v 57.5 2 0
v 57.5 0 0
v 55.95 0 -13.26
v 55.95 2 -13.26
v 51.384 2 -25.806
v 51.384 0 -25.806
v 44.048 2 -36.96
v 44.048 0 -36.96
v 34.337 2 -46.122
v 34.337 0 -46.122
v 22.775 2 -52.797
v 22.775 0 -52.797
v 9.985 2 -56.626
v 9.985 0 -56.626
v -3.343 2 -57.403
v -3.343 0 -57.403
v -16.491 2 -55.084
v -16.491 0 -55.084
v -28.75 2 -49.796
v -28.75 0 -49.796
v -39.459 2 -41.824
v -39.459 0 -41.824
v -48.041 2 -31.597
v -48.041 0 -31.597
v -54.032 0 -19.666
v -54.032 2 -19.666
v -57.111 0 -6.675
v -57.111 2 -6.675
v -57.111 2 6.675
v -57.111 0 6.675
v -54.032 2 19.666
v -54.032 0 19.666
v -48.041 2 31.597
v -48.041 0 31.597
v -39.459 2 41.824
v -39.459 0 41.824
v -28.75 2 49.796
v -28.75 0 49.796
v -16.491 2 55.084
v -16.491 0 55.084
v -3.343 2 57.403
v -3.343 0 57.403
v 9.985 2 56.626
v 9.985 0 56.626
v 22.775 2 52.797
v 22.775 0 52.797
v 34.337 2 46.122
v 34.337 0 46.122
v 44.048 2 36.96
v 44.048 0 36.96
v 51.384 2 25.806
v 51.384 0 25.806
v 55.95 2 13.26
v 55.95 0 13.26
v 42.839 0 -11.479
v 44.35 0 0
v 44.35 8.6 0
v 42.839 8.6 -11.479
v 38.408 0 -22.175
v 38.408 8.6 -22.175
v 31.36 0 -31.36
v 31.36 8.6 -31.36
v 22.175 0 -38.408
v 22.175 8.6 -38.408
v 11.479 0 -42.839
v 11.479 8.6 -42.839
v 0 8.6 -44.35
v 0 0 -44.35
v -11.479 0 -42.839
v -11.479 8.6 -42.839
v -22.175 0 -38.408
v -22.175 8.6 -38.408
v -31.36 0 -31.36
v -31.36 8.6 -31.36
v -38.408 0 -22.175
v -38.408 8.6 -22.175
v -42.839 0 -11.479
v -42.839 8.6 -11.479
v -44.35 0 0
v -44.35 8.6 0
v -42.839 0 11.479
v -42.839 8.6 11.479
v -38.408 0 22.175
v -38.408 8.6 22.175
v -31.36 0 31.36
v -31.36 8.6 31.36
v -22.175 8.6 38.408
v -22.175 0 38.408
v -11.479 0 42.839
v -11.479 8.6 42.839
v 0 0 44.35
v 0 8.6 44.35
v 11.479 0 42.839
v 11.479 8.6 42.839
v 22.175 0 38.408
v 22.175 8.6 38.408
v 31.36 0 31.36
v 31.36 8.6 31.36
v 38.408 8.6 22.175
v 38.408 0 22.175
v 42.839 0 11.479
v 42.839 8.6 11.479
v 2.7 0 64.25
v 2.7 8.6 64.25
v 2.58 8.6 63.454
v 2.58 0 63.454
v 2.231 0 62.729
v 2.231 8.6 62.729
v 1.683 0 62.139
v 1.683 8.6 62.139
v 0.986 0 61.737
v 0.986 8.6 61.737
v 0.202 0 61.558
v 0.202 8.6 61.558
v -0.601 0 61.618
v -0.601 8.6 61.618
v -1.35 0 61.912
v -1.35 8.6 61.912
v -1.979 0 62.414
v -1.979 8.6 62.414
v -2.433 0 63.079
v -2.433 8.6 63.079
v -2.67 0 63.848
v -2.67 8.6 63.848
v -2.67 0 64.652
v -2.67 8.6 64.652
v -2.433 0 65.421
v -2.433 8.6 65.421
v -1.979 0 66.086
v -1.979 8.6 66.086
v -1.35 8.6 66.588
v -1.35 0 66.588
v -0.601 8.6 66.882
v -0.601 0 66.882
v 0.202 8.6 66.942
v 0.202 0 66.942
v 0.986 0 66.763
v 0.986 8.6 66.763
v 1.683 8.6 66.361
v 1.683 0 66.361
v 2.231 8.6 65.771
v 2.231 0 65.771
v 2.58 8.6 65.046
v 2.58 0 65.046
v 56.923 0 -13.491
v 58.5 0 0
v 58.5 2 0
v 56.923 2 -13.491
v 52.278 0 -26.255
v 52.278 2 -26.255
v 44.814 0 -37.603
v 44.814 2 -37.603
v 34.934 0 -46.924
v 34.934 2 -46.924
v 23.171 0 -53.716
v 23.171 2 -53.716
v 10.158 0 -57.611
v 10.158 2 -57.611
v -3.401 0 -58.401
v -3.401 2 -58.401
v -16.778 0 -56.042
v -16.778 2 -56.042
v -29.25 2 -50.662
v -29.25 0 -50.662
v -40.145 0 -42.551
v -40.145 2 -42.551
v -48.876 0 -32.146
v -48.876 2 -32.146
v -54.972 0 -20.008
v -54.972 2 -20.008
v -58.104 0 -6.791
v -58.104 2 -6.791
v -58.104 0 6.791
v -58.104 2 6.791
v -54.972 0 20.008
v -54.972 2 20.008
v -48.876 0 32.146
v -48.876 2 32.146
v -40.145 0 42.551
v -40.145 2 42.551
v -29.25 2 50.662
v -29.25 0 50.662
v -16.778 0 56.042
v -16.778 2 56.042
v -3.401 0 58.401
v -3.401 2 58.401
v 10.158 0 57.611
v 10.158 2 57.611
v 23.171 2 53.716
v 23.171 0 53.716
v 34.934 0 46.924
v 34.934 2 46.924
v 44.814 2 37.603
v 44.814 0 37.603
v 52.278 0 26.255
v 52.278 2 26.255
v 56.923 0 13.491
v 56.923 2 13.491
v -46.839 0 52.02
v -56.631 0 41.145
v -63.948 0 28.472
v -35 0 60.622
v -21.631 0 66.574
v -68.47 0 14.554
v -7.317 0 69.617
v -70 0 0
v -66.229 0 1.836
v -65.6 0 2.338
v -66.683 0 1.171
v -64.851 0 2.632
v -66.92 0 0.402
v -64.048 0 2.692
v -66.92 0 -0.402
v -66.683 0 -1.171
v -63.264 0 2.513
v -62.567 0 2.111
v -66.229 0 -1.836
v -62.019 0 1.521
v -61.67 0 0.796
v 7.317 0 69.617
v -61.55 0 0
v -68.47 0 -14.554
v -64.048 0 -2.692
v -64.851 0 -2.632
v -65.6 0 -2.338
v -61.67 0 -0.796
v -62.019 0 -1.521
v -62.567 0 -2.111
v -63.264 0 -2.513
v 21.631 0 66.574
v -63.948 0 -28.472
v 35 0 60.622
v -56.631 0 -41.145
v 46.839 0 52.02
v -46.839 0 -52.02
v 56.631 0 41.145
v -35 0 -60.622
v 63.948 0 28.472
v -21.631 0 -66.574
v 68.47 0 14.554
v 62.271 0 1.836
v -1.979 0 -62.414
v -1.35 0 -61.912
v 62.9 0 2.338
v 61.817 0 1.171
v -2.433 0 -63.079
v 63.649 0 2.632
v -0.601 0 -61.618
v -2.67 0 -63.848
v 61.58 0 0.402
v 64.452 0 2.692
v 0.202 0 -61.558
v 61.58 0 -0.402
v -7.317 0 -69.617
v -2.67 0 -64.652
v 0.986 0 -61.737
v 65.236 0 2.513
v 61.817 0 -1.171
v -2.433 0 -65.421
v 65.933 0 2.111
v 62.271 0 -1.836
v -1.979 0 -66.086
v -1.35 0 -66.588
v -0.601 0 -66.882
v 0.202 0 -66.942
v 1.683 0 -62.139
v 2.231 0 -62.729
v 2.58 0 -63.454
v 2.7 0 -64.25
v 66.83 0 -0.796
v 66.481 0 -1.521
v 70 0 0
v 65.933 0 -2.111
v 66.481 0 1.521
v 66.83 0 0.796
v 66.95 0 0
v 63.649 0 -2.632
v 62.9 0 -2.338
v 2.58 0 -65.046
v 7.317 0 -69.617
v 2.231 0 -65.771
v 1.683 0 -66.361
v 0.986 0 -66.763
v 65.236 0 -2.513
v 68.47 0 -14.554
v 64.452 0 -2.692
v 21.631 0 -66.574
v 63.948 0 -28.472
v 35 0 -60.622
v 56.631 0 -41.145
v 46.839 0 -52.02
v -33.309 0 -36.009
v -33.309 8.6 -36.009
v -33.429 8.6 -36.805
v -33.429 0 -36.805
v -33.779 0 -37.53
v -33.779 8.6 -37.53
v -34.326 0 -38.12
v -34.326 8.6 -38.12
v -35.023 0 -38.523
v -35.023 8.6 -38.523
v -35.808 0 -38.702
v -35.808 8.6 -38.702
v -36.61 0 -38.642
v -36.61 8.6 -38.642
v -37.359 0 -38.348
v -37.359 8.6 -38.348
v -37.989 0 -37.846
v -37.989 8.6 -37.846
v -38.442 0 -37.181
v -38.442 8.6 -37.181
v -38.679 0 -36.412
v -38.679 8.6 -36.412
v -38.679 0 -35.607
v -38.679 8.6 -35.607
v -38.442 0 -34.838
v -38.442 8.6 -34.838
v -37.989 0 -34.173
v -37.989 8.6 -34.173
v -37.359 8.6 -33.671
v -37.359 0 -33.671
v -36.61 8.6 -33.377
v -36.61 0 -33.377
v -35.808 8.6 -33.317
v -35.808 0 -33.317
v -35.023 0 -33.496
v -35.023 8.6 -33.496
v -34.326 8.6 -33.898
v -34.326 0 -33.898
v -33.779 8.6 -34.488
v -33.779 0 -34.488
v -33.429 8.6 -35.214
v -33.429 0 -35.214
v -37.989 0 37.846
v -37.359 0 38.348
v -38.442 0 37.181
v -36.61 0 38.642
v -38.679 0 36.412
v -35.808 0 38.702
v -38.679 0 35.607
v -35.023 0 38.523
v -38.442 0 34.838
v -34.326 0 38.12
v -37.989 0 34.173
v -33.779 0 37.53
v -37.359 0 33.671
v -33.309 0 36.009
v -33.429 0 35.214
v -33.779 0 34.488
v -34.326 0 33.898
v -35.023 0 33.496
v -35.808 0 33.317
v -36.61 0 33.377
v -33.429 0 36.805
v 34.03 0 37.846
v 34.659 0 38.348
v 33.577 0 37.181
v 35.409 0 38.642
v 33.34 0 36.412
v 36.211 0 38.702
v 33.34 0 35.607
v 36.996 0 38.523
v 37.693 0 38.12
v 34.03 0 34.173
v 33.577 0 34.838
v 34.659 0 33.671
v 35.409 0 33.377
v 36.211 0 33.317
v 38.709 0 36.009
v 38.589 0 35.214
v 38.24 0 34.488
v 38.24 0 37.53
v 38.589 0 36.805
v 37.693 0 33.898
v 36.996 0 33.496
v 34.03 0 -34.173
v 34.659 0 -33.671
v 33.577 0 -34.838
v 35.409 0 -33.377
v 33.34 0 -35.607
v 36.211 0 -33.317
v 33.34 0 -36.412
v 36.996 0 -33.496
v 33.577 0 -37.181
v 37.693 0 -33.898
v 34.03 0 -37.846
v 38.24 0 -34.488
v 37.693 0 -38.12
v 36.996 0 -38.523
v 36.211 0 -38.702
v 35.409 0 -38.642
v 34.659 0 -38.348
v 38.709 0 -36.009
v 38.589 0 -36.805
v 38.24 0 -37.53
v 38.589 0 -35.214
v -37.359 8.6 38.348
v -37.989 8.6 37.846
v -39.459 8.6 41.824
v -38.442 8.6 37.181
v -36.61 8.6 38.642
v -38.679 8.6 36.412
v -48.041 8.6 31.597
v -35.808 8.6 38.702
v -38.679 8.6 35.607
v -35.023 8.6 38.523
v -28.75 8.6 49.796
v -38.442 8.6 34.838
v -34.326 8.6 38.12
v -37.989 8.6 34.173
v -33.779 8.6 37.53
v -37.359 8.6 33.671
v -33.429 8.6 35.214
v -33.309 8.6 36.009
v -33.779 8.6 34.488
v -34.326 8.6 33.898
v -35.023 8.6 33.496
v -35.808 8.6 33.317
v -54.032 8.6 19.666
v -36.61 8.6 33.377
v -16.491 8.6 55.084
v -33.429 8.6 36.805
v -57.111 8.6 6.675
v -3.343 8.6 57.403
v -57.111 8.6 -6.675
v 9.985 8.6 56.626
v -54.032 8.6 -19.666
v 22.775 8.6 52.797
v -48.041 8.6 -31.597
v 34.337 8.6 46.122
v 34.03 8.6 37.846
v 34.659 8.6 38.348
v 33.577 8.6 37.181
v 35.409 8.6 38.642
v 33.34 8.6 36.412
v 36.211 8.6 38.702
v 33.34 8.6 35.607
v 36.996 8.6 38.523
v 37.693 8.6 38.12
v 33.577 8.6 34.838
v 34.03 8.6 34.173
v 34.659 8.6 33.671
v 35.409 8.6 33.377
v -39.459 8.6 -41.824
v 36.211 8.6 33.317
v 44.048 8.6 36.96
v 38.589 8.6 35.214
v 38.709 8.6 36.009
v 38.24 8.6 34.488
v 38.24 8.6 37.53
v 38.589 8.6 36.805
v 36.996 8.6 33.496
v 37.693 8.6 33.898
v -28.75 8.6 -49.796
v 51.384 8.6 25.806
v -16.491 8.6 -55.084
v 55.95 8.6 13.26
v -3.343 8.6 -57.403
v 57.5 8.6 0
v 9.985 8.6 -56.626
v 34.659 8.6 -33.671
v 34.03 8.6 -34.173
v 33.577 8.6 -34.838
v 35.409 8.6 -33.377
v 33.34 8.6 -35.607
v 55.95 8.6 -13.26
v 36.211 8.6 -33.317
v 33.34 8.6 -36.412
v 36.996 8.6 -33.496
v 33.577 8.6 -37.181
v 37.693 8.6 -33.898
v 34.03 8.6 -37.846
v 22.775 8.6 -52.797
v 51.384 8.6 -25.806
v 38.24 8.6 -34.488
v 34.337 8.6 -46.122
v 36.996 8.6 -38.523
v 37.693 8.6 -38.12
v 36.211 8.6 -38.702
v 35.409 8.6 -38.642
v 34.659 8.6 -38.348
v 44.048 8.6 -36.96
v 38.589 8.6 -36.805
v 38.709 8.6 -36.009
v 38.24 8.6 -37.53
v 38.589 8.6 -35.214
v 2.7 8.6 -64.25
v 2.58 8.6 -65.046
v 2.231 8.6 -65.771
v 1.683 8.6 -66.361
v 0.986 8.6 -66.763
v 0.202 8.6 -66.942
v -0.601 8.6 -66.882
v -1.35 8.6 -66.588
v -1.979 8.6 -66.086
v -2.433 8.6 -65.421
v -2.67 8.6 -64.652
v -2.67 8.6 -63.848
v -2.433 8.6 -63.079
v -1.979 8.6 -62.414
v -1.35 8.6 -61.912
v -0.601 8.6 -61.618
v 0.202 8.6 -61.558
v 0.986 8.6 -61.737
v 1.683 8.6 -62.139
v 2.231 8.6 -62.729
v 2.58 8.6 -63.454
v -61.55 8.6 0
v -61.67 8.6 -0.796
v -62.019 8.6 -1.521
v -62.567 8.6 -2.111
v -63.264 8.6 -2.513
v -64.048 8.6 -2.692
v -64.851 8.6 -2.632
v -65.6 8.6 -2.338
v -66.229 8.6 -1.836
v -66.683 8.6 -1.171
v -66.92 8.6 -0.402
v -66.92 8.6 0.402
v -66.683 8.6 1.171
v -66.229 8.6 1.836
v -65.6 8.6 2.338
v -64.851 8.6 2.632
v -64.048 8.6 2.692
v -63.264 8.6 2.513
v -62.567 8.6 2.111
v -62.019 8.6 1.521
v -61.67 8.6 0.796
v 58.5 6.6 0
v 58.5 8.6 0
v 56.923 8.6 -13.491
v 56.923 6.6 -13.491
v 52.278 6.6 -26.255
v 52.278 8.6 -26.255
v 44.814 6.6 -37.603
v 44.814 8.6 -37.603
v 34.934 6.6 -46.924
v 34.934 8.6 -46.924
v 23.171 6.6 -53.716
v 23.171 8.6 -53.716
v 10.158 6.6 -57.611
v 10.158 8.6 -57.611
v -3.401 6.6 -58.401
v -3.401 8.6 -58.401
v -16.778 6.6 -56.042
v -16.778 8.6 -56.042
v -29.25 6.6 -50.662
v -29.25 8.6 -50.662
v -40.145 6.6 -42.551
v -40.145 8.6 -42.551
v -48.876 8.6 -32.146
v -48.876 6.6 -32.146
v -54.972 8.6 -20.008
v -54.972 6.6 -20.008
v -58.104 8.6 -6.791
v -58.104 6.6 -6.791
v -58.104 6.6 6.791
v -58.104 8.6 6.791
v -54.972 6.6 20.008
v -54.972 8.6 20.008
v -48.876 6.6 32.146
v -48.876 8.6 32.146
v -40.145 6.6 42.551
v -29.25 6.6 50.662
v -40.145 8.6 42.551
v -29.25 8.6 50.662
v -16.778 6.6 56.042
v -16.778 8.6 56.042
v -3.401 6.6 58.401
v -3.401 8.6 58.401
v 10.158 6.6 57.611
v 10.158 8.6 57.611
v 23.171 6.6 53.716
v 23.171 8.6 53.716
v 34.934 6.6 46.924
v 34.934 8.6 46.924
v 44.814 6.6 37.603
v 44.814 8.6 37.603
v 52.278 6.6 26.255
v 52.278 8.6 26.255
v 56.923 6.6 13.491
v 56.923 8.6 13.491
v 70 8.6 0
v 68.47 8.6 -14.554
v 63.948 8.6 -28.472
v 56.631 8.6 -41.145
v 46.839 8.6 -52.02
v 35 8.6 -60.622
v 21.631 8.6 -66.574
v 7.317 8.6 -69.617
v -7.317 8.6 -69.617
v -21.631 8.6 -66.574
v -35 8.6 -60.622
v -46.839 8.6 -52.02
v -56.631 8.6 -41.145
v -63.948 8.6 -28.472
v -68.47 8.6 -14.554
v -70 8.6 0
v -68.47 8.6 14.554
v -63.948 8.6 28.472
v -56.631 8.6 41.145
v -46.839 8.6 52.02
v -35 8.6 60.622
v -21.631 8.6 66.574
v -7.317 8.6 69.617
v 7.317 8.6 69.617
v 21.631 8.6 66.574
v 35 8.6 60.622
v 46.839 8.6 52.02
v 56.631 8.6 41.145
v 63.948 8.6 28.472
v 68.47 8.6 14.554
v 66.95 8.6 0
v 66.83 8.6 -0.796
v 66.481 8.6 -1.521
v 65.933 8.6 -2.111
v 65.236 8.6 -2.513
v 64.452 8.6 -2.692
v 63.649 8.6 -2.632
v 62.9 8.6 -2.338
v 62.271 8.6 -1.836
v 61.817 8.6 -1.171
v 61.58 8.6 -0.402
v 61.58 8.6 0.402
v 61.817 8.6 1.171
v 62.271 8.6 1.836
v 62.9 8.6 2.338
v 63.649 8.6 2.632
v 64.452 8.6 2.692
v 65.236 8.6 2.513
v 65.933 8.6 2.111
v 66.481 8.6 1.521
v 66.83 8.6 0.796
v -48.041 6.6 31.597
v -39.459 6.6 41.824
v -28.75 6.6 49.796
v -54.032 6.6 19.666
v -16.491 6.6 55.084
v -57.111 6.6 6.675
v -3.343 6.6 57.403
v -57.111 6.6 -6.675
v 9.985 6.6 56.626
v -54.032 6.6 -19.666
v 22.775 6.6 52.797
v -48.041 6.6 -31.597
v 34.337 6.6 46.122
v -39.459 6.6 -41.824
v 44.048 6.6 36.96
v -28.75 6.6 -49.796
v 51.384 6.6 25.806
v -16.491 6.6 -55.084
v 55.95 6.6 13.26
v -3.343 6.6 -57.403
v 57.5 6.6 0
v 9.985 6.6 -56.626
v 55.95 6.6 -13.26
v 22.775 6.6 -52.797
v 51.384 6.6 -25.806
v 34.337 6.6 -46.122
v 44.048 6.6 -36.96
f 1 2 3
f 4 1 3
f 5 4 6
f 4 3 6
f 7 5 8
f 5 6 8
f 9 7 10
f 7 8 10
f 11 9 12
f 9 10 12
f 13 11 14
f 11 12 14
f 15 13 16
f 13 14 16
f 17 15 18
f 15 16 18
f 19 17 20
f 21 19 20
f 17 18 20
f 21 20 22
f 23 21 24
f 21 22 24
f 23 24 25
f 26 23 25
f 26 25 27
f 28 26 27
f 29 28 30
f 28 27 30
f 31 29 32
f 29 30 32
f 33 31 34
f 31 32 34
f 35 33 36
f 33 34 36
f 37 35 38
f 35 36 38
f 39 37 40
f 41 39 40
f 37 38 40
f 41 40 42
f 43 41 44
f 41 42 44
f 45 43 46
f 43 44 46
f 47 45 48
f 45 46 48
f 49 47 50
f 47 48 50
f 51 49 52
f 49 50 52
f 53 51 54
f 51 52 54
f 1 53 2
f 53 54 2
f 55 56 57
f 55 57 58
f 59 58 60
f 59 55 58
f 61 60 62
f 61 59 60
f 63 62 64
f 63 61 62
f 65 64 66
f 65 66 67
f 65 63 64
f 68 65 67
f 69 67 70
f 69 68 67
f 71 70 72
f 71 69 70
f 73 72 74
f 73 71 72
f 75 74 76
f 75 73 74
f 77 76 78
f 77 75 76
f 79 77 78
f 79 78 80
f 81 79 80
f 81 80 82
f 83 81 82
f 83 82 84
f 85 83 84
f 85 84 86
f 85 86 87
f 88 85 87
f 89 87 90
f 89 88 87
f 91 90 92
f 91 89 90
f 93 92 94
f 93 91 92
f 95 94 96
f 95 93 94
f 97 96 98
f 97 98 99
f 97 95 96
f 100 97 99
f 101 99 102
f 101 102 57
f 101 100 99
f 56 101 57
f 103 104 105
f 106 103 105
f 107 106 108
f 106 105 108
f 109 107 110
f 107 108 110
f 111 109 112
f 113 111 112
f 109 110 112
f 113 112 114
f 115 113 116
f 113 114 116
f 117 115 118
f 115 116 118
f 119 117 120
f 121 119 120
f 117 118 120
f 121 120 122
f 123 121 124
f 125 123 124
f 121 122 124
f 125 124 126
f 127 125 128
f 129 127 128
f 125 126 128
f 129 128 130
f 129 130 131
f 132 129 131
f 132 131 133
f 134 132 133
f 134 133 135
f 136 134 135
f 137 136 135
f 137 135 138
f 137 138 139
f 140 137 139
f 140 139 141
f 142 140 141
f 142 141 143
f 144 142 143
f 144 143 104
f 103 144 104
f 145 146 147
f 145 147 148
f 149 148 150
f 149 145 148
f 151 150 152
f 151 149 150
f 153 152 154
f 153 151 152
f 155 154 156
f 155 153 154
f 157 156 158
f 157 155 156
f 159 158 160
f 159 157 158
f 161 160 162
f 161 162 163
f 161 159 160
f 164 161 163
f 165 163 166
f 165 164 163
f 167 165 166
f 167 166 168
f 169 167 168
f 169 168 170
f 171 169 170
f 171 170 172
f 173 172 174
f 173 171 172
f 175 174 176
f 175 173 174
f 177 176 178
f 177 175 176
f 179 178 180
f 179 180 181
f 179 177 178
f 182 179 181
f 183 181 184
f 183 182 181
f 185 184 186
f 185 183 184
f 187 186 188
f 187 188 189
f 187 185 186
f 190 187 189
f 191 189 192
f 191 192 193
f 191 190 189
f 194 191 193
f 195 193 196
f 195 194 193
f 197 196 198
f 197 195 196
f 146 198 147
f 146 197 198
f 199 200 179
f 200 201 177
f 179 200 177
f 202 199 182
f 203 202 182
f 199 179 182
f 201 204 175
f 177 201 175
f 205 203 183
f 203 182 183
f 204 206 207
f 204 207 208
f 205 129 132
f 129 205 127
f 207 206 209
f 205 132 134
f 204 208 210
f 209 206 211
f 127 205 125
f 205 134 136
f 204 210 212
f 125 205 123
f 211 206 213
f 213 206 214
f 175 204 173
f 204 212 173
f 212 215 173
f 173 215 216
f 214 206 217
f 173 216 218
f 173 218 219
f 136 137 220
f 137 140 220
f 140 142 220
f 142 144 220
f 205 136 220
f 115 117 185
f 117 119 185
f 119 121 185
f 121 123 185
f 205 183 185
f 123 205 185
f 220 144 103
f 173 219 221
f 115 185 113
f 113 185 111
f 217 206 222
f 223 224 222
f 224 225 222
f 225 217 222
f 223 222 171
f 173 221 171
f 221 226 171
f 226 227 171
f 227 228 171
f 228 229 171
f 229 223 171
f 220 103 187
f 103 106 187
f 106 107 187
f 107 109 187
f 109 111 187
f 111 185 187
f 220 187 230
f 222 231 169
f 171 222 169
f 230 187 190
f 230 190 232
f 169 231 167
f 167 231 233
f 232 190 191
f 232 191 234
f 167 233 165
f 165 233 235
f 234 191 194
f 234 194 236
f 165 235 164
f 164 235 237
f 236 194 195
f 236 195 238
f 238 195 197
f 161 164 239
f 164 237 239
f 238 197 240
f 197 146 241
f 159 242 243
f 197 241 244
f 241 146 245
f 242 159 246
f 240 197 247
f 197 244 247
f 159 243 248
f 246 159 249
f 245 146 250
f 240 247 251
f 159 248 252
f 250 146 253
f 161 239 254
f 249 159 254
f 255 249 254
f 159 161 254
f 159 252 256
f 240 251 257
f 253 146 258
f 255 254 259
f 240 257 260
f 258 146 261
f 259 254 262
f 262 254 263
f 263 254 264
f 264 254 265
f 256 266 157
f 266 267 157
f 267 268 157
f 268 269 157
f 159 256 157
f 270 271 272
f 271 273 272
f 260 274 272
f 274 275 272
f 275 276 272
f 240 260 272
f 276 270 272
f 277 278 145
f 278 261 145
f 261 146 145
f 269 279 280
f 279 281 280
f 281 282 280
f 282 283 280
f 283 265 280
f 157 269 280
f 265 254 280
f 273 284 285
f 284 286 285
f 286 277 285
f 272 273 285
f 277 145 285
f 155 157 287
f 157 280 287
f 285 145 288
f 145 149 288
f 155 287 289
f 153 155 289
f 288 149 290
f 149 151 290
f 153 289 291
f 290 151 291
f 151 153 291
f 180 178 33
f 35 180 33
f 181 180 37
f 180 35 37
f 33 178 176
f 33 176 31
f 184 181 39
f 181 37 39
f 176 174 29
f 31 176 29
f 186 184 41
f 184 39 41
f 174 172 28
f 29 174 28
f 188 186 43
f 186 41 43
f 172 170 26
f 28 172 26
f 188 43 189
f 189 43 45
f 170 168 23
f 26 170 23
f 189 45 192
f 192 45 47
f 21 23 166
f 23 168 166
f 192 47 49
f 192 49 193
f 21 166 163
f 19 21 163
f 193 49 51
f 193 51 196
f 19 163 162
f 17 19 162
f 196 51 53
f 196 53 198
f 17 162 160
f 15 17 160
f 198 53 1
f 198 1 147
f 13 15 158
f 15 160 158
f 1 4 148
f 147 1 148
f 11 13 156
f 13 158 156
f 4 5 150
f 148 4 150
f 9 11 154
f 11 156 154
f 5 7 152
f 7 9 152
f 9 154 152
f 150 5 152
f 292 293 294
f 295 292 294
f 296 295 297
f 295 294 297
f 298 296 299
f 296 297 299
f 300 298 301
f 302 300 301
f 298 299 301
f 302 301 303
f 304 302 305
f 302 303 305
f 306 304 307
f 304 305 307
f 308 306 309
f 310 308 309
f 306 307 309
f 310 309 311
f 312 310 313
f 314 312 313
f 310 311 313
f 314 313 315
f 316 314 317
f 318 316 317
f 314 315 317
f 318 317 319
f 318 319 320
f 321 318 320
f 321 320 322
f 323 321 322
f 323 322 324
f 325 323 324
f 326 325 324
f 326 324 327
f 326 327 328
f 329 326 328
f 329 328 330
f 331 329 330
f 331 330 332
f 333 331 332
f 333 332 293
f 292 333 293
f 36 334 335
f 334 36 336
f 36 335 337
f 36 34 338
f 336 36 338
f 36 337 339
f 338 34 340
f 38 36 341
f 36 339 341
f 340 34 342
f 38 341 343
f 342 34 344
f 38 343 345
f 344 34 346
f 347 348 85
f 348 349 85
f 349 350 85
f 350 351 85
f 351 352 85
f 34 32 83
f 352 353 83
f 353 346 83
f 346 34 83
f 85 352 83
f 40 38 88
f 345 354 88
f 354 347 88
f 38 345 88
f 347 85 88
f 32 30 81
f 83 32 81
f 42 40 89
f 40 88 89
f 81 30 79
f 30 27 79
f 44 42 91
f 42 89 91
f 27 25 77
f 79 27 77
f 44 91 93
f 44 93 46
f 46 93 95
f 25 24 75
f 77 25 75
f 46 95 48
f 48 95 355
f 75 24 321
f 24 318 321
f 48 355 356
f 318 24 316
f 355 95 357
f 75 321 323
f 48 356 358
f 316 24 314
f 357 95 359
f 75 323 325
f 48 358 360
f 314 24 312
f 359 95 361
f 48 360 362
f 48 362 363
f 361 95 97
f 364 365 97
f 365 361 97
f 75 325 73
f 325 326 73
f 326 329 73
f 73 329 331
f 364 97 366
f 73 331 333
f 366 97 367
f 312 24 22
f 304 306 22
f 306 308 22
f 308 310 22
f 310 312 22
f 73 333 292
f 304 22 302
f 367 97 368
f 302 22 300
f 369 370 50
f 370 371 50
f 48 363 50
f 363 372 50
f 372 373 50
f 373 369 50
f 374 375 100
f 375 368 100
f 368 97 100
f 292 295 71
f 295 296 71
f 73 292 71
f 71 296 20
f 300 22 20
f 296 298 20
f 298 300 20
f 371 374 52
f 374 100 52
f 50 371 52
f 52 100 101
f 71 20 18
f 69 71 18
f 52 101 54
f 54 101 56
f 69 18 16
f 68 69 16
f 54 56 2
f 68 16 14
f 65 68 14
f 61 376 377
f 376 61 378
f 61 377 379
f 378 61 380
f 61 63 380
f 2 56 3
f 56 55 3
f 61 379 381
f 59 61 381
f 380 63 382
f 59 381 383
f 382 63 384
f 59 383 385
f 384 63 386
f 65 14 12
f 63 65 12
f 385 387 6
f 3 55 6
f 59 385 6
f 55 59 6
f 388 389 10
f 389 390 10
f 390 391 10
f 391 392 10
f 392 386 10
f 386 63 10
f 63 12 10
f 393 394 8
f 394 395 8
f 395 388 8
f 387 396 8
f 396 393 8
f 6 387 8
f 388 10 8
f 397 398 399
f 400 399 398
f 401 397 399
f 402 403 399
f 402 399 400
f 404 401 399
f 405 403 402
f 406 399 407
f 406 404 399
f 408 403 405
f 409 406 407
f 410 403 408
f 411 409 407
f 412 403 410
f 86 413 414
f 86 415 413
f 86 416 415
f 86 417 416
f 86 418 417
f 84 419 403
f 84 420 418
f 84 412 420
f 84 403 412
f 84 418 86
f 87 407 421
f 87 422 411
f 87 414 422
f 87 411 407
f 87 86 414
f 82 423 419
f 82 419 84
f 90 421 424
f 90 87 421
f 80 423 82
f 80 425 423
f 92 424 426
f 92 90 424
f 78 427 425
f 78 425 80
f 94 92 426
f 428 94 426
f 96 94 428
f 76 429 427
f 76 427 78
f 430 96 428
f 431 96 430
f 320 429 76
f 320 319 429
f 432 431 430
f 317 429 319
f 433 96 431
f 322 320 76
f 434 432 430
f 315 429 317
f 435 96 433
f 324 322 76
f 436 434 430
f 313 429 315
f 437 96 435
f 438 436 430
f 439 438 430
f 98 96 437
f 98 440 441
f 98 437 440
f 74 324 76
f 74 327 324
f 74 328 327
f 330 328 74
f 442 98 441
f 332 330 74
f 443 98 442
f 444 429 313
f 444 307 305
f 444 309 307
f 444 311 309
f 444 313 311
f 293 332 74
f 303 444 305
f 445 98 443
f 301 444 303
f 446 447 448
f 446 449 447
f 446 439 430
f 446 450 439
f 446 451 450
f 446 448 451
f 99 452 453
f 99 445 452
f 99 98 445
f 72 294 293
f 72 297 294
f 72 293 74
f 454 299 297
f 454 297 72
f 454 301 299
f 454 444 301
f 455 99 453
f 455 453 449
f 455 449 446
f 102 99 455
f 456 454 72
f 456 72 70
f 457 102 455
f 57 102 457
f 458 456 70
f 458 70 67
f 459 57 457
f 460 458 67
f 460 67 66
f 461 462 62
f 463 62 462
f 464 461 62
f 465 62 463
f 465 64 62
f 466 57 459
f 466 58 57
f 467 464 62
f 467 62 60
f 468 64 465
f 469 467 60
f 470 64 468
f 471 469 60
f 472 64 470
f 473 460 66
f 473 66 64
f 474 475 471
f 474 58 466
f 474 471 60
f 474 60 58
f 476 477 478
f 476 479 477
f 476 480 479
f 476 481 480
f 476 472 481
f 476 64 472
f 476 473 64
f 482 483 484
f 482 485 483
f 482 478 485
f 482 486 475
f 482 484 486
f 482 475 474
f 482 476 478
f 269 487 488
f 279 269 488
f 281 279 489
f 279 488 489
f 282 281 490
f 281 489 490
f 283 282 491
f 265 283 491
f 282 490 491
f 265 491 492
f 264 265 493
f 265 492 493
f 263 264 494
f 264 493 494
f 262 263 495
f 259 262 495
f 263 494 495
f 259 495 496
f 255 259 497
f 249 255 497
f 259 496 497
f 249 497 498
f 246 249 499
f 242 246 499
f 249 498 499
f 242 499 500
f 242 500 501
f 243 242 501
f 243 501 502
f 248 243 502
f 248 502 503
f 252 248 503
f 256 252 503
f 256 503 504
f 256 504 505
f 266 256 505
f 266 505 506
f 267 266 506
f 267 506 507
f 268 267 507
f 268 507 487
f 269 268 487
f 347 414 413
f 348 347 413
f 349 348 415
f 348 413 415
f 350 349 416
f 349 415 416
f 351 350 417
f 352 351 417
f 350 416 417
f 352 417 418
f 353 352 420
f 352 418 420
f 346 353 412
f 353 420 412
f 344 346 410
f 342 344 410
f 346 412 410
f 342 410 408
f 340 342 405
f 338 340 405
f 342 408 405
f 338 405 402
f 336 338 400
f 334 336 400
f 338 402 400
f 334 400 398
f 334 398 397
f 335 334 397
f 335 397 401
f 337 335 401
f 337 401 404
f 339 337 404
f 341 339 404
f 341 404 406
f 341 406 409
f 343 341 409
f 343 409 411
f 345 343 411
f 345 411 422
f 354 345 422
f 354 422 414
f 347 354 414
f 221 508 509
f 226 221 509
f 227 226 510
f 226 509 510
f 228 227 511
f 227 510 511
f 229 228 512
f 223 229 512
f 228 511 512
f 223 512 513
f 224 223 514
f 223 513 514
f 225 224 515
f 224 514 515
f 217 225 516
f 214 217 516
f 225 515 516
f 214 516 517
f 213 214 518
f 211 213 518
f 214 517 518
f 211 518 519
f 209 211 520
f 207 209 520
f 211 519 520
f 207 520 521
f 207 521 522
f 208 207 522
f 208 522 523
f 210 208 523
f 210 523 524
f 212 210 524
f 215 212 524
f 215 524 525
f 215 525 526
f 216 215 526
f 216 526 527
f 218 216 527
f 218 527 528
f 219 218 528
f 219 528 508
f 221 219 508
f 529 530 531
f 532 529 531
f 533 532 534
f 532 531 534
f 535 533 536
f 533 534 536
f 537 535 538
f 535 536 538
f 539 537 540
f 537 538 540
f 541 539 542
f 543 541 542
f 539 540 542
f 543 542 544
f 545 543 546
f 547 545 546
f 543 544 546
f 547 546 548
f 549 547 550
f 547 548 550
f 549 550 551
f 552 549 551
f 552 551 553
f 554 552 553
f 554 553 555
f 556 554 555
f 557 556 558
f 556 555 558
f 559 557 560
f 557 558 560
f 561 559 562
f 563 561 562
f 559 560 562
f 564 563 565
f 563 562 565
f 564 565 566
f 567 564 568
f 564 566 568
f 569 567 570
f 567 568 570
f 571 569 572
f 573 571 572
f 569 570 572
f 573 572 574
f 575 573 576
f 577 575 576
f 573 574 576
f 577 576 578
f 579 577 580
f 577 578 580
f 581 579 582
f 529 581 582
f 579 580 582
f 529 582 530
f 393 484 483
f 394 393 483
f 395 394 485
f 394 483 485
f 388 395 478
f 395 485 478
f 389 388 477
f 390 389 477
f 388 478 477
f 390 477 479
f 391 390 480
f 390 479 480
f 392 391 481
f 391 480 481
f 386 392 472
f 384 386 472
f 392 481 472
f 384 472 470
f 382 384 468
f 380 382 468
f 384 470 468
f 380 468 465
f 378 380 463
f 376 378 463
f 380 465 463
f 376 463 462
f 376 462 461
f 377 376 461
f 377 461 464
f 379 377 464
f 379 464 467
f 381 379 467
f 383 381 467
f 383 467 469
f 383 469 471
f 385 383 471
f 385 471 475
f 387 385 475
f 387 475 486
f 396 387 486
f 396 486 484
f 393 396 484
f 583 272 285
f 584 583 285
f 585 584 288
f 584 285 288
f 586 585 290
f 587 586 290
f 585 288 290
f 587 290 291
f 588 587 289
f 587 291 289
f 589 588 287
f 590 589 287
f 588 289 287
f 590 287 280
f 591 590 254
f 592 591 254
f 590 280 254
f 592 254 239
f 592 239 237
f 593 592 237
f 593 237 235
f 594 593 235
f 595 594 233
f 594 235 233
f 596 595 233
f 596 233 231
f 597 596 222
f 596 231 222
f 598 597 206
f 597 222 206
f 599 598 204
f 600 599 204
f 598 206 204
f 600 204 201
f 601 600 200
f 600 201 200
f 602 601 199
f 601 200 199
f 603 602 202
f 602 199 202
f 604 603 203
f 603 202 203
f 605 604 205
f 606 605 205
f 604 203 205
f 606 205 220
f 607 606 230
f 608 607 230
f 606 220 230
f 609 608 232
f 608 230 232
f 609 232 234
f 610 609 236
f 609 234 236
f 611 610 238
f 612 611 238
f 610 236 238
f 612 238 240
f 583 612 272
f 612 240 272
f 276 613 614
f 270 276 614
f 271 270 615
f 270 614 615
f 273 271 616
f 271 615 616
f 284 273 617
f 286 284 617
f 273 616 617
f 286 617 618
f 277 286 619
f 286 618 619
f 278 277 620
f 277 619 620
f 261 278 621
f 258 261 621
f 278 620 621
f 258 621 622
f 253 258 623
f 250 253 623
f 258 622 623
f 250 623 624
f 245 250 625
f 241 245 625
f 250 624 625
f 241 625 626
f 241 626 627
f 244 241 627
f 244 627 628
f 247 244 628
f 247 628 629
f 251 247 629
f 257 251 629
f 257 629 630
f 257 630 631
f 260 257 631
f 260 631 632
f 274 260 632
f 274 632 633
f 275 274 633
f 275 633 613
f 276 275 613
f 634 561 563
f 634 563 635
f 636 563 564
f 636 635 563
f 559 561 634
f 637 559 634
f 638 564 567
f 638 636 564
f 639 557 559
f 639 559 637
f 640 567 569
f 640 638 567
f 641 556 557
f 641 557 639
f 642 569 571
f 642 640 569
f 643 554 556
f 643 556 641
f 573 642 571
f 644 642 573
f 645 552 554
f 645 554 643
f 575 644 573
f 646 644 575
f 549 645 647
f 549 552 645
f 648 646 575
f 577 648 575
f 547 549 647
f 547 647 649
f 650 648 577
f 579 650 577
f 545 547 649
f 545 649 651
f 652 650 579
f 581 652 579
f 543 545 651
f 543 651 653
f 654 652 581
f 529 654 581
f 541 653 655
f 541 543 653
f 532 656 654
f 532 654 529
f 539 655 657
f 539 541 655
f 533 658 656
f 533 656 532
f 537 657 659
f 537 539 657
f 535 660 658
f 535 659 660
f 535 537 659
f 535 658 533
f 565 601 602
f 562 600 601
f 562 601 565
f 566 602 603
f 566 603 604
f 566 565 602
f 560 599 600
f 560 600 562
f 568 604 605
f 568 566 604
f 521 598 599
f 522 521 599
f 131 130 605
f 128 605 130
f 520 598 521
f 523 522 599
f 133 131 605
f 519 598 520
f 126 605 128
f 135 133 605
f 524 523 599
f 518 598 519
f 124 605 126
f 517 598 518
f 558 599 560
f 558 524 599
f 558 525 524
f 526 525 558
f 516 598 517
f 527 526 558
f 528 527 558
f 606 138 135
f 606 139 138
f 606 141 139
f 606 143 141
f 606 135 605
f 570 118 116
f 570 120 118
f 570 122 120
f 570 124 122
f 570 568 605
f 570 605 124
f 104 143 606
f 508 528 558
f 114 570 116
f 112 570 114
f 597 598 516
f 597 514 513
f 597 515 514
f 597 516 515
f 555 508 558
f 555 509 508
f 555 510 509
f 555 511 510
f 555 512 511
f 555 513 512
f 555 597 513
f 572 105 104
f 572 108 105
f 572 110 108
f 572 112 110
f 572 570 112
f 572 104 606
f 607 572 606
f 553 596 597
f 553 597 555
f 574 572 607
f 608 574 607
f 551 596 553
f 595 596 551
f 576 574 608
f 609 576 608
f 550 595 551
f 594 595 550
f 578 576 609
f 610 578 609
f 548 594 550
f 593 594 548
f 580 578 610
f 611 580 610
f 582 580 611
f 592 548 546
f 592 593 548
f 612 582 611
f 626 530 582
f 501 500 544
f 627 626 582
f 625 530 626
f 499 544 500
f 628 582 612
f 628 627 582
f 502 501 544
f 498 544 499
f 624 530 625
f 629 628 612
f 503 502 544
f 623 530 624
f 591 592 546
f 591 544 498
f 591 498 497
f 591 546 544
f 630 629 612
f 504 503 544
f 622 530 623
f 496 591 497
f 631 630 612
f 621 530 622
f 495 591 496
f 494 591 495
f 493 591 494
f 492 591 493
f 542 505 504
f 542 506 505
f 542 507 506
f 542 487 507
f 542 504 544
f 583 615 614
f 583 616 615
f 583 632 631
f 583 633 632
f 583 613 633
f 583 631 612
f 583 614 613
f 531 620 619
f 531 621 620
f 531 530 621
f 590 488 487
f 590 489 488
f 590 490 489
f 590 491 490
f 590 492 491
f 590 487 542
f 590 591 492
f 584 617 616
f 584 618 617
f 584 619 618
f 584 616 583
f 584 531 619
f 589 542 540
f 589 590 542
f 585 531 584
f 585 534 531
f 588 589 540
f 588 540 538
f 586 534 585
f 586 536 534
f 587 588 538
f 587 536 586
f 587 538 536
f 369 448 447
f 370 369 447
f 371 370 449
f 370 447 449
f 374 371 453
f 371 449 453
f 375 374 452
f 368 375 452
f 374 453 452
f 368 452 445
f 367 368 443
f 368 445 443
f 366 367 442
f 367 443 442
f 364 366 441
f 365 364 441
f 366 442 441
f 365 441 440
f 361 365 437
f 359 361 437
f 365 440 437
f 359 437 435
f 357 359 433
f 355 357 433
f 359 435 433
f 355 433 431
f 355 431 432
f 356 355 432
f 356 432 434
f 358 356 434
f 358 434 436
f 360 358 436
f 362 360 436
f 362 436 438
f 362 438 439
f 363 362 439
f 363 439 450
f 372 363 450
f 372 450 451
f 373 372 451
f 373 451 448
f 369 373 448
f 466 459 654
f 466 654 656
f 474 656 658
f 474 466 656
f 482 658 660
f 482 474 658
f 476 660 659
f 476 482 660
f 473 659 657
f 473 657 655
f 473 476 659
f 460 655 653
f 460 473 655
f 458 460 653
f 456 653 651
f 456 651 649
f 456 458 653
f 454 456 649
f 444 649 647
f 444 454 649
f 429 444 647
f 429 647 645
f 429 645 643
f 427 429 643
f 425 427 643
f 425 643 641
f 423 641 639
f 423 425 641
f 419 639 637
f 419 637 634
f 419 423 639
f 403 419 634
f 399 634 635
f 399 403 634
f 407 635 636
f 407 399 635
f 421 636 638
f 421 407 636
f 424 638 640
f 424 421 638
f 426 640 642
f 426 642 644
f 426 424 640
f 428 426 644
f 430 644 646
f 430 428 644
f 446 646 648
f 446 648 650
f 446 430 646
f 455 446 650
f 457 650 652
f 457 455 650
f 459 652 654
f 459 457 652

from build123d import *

# Parameters (mm, degrees)
SKETCH1_R           = 70
SKETCH1_R_2         = 44.35
BOSS_EXTRUDE1_DEPTH = 8.6
SKETCH2_R           = 58.5
SKETCH2_R_2         = 57.5
CUT_EXTRUDE1_DEPTH  = 2
SKETCH3_R           = 2.7
CUT_EXTRUDE2_DEPTH  = 9.6
SKETCH4_R           = 2.7
CUT_EXTRUDE3_DEPTH  = 9.6


with BuildPart() as part:
    # Sketch1 → Boss-Extrude1 (new body)
    with BuildSketch(Plane(origin=(0, 0, 0), x_dir=(1, 0, 0), z_dir=(0, 1, 0))):
        Circle(SKETCH1_R)
        Circle(SKETCH1_R_2, mode=Mode.SUBTRACT)
    extrude(amount=BOSS_EXTRUDE1_DEPTH)

    # Sketch2 → Cut-Extrude1 (cut)
    with BuildSketch(Plane(origin=(0, 8.6, 0), x_dir=(1, 0, 0), z_dir=(0, 1, 0))):
        Circle(SKETCH2_R)
        Circle(SKETCH2_R_2, mode=Mode.SUBTRACT)
    cut_extrude1 = extrude(amount=-CUT_EXTRUDE1_DEPTH, mode=Mode.SUBTRACT)

    # Mirror1: Cut-Extrude1 across plane
    add(cut_extrude1.mirror(Plane.ZX.offset(4.3)), mode=Mode.SUBTRACT)

    # Sketch3 → Cut-Extrude2 (cut, through all)
    with BuildSketch(Plane(origin=(0, 8.6, 0), x_dir=(1, 0, 0), z_dir=(0, 1, 0))):
        with Locations((0, 64.25)):
            Circle(SKETCH3_R)
        with Locations((64.25, 0)):
            Circle(SKETCH3_R)
        with Locations((0, -64.25)):
            Circle(SKETCH3_R)
        with Locations((-64.25, 0)):
            Circle(SKETCH3_R)
    extrude(amount=-CUT_EXTRUDE2_DEPTH, mode=Mode.SUBTRACT)

    # Sketch4 → Cut-Extrude3 (cut, through all)
    with BuildSketch(Plane(origin=(0, 8.6, 0), x_dir=(1, 0, 0), z_dir=(0, 1, 0))):
        with Locations((-36.009412832, 36.009412832)):
            Circle(SKETCH4_R)
        with Locations((36.009412832, 36.009412832)):
            Circle(SKETCH4_R)
        with Locations((36.009412832, -36.009412832)):
            Circle(SKETCH4_R)
        with Locations((-36.009412832, -36.009412832)):
            Circle(SKETCH4_R)
    extrude(amount=-CUT_EXTRUDE3_DEPTH, mode=Mode.SUBTRACT)


solid = part.part
